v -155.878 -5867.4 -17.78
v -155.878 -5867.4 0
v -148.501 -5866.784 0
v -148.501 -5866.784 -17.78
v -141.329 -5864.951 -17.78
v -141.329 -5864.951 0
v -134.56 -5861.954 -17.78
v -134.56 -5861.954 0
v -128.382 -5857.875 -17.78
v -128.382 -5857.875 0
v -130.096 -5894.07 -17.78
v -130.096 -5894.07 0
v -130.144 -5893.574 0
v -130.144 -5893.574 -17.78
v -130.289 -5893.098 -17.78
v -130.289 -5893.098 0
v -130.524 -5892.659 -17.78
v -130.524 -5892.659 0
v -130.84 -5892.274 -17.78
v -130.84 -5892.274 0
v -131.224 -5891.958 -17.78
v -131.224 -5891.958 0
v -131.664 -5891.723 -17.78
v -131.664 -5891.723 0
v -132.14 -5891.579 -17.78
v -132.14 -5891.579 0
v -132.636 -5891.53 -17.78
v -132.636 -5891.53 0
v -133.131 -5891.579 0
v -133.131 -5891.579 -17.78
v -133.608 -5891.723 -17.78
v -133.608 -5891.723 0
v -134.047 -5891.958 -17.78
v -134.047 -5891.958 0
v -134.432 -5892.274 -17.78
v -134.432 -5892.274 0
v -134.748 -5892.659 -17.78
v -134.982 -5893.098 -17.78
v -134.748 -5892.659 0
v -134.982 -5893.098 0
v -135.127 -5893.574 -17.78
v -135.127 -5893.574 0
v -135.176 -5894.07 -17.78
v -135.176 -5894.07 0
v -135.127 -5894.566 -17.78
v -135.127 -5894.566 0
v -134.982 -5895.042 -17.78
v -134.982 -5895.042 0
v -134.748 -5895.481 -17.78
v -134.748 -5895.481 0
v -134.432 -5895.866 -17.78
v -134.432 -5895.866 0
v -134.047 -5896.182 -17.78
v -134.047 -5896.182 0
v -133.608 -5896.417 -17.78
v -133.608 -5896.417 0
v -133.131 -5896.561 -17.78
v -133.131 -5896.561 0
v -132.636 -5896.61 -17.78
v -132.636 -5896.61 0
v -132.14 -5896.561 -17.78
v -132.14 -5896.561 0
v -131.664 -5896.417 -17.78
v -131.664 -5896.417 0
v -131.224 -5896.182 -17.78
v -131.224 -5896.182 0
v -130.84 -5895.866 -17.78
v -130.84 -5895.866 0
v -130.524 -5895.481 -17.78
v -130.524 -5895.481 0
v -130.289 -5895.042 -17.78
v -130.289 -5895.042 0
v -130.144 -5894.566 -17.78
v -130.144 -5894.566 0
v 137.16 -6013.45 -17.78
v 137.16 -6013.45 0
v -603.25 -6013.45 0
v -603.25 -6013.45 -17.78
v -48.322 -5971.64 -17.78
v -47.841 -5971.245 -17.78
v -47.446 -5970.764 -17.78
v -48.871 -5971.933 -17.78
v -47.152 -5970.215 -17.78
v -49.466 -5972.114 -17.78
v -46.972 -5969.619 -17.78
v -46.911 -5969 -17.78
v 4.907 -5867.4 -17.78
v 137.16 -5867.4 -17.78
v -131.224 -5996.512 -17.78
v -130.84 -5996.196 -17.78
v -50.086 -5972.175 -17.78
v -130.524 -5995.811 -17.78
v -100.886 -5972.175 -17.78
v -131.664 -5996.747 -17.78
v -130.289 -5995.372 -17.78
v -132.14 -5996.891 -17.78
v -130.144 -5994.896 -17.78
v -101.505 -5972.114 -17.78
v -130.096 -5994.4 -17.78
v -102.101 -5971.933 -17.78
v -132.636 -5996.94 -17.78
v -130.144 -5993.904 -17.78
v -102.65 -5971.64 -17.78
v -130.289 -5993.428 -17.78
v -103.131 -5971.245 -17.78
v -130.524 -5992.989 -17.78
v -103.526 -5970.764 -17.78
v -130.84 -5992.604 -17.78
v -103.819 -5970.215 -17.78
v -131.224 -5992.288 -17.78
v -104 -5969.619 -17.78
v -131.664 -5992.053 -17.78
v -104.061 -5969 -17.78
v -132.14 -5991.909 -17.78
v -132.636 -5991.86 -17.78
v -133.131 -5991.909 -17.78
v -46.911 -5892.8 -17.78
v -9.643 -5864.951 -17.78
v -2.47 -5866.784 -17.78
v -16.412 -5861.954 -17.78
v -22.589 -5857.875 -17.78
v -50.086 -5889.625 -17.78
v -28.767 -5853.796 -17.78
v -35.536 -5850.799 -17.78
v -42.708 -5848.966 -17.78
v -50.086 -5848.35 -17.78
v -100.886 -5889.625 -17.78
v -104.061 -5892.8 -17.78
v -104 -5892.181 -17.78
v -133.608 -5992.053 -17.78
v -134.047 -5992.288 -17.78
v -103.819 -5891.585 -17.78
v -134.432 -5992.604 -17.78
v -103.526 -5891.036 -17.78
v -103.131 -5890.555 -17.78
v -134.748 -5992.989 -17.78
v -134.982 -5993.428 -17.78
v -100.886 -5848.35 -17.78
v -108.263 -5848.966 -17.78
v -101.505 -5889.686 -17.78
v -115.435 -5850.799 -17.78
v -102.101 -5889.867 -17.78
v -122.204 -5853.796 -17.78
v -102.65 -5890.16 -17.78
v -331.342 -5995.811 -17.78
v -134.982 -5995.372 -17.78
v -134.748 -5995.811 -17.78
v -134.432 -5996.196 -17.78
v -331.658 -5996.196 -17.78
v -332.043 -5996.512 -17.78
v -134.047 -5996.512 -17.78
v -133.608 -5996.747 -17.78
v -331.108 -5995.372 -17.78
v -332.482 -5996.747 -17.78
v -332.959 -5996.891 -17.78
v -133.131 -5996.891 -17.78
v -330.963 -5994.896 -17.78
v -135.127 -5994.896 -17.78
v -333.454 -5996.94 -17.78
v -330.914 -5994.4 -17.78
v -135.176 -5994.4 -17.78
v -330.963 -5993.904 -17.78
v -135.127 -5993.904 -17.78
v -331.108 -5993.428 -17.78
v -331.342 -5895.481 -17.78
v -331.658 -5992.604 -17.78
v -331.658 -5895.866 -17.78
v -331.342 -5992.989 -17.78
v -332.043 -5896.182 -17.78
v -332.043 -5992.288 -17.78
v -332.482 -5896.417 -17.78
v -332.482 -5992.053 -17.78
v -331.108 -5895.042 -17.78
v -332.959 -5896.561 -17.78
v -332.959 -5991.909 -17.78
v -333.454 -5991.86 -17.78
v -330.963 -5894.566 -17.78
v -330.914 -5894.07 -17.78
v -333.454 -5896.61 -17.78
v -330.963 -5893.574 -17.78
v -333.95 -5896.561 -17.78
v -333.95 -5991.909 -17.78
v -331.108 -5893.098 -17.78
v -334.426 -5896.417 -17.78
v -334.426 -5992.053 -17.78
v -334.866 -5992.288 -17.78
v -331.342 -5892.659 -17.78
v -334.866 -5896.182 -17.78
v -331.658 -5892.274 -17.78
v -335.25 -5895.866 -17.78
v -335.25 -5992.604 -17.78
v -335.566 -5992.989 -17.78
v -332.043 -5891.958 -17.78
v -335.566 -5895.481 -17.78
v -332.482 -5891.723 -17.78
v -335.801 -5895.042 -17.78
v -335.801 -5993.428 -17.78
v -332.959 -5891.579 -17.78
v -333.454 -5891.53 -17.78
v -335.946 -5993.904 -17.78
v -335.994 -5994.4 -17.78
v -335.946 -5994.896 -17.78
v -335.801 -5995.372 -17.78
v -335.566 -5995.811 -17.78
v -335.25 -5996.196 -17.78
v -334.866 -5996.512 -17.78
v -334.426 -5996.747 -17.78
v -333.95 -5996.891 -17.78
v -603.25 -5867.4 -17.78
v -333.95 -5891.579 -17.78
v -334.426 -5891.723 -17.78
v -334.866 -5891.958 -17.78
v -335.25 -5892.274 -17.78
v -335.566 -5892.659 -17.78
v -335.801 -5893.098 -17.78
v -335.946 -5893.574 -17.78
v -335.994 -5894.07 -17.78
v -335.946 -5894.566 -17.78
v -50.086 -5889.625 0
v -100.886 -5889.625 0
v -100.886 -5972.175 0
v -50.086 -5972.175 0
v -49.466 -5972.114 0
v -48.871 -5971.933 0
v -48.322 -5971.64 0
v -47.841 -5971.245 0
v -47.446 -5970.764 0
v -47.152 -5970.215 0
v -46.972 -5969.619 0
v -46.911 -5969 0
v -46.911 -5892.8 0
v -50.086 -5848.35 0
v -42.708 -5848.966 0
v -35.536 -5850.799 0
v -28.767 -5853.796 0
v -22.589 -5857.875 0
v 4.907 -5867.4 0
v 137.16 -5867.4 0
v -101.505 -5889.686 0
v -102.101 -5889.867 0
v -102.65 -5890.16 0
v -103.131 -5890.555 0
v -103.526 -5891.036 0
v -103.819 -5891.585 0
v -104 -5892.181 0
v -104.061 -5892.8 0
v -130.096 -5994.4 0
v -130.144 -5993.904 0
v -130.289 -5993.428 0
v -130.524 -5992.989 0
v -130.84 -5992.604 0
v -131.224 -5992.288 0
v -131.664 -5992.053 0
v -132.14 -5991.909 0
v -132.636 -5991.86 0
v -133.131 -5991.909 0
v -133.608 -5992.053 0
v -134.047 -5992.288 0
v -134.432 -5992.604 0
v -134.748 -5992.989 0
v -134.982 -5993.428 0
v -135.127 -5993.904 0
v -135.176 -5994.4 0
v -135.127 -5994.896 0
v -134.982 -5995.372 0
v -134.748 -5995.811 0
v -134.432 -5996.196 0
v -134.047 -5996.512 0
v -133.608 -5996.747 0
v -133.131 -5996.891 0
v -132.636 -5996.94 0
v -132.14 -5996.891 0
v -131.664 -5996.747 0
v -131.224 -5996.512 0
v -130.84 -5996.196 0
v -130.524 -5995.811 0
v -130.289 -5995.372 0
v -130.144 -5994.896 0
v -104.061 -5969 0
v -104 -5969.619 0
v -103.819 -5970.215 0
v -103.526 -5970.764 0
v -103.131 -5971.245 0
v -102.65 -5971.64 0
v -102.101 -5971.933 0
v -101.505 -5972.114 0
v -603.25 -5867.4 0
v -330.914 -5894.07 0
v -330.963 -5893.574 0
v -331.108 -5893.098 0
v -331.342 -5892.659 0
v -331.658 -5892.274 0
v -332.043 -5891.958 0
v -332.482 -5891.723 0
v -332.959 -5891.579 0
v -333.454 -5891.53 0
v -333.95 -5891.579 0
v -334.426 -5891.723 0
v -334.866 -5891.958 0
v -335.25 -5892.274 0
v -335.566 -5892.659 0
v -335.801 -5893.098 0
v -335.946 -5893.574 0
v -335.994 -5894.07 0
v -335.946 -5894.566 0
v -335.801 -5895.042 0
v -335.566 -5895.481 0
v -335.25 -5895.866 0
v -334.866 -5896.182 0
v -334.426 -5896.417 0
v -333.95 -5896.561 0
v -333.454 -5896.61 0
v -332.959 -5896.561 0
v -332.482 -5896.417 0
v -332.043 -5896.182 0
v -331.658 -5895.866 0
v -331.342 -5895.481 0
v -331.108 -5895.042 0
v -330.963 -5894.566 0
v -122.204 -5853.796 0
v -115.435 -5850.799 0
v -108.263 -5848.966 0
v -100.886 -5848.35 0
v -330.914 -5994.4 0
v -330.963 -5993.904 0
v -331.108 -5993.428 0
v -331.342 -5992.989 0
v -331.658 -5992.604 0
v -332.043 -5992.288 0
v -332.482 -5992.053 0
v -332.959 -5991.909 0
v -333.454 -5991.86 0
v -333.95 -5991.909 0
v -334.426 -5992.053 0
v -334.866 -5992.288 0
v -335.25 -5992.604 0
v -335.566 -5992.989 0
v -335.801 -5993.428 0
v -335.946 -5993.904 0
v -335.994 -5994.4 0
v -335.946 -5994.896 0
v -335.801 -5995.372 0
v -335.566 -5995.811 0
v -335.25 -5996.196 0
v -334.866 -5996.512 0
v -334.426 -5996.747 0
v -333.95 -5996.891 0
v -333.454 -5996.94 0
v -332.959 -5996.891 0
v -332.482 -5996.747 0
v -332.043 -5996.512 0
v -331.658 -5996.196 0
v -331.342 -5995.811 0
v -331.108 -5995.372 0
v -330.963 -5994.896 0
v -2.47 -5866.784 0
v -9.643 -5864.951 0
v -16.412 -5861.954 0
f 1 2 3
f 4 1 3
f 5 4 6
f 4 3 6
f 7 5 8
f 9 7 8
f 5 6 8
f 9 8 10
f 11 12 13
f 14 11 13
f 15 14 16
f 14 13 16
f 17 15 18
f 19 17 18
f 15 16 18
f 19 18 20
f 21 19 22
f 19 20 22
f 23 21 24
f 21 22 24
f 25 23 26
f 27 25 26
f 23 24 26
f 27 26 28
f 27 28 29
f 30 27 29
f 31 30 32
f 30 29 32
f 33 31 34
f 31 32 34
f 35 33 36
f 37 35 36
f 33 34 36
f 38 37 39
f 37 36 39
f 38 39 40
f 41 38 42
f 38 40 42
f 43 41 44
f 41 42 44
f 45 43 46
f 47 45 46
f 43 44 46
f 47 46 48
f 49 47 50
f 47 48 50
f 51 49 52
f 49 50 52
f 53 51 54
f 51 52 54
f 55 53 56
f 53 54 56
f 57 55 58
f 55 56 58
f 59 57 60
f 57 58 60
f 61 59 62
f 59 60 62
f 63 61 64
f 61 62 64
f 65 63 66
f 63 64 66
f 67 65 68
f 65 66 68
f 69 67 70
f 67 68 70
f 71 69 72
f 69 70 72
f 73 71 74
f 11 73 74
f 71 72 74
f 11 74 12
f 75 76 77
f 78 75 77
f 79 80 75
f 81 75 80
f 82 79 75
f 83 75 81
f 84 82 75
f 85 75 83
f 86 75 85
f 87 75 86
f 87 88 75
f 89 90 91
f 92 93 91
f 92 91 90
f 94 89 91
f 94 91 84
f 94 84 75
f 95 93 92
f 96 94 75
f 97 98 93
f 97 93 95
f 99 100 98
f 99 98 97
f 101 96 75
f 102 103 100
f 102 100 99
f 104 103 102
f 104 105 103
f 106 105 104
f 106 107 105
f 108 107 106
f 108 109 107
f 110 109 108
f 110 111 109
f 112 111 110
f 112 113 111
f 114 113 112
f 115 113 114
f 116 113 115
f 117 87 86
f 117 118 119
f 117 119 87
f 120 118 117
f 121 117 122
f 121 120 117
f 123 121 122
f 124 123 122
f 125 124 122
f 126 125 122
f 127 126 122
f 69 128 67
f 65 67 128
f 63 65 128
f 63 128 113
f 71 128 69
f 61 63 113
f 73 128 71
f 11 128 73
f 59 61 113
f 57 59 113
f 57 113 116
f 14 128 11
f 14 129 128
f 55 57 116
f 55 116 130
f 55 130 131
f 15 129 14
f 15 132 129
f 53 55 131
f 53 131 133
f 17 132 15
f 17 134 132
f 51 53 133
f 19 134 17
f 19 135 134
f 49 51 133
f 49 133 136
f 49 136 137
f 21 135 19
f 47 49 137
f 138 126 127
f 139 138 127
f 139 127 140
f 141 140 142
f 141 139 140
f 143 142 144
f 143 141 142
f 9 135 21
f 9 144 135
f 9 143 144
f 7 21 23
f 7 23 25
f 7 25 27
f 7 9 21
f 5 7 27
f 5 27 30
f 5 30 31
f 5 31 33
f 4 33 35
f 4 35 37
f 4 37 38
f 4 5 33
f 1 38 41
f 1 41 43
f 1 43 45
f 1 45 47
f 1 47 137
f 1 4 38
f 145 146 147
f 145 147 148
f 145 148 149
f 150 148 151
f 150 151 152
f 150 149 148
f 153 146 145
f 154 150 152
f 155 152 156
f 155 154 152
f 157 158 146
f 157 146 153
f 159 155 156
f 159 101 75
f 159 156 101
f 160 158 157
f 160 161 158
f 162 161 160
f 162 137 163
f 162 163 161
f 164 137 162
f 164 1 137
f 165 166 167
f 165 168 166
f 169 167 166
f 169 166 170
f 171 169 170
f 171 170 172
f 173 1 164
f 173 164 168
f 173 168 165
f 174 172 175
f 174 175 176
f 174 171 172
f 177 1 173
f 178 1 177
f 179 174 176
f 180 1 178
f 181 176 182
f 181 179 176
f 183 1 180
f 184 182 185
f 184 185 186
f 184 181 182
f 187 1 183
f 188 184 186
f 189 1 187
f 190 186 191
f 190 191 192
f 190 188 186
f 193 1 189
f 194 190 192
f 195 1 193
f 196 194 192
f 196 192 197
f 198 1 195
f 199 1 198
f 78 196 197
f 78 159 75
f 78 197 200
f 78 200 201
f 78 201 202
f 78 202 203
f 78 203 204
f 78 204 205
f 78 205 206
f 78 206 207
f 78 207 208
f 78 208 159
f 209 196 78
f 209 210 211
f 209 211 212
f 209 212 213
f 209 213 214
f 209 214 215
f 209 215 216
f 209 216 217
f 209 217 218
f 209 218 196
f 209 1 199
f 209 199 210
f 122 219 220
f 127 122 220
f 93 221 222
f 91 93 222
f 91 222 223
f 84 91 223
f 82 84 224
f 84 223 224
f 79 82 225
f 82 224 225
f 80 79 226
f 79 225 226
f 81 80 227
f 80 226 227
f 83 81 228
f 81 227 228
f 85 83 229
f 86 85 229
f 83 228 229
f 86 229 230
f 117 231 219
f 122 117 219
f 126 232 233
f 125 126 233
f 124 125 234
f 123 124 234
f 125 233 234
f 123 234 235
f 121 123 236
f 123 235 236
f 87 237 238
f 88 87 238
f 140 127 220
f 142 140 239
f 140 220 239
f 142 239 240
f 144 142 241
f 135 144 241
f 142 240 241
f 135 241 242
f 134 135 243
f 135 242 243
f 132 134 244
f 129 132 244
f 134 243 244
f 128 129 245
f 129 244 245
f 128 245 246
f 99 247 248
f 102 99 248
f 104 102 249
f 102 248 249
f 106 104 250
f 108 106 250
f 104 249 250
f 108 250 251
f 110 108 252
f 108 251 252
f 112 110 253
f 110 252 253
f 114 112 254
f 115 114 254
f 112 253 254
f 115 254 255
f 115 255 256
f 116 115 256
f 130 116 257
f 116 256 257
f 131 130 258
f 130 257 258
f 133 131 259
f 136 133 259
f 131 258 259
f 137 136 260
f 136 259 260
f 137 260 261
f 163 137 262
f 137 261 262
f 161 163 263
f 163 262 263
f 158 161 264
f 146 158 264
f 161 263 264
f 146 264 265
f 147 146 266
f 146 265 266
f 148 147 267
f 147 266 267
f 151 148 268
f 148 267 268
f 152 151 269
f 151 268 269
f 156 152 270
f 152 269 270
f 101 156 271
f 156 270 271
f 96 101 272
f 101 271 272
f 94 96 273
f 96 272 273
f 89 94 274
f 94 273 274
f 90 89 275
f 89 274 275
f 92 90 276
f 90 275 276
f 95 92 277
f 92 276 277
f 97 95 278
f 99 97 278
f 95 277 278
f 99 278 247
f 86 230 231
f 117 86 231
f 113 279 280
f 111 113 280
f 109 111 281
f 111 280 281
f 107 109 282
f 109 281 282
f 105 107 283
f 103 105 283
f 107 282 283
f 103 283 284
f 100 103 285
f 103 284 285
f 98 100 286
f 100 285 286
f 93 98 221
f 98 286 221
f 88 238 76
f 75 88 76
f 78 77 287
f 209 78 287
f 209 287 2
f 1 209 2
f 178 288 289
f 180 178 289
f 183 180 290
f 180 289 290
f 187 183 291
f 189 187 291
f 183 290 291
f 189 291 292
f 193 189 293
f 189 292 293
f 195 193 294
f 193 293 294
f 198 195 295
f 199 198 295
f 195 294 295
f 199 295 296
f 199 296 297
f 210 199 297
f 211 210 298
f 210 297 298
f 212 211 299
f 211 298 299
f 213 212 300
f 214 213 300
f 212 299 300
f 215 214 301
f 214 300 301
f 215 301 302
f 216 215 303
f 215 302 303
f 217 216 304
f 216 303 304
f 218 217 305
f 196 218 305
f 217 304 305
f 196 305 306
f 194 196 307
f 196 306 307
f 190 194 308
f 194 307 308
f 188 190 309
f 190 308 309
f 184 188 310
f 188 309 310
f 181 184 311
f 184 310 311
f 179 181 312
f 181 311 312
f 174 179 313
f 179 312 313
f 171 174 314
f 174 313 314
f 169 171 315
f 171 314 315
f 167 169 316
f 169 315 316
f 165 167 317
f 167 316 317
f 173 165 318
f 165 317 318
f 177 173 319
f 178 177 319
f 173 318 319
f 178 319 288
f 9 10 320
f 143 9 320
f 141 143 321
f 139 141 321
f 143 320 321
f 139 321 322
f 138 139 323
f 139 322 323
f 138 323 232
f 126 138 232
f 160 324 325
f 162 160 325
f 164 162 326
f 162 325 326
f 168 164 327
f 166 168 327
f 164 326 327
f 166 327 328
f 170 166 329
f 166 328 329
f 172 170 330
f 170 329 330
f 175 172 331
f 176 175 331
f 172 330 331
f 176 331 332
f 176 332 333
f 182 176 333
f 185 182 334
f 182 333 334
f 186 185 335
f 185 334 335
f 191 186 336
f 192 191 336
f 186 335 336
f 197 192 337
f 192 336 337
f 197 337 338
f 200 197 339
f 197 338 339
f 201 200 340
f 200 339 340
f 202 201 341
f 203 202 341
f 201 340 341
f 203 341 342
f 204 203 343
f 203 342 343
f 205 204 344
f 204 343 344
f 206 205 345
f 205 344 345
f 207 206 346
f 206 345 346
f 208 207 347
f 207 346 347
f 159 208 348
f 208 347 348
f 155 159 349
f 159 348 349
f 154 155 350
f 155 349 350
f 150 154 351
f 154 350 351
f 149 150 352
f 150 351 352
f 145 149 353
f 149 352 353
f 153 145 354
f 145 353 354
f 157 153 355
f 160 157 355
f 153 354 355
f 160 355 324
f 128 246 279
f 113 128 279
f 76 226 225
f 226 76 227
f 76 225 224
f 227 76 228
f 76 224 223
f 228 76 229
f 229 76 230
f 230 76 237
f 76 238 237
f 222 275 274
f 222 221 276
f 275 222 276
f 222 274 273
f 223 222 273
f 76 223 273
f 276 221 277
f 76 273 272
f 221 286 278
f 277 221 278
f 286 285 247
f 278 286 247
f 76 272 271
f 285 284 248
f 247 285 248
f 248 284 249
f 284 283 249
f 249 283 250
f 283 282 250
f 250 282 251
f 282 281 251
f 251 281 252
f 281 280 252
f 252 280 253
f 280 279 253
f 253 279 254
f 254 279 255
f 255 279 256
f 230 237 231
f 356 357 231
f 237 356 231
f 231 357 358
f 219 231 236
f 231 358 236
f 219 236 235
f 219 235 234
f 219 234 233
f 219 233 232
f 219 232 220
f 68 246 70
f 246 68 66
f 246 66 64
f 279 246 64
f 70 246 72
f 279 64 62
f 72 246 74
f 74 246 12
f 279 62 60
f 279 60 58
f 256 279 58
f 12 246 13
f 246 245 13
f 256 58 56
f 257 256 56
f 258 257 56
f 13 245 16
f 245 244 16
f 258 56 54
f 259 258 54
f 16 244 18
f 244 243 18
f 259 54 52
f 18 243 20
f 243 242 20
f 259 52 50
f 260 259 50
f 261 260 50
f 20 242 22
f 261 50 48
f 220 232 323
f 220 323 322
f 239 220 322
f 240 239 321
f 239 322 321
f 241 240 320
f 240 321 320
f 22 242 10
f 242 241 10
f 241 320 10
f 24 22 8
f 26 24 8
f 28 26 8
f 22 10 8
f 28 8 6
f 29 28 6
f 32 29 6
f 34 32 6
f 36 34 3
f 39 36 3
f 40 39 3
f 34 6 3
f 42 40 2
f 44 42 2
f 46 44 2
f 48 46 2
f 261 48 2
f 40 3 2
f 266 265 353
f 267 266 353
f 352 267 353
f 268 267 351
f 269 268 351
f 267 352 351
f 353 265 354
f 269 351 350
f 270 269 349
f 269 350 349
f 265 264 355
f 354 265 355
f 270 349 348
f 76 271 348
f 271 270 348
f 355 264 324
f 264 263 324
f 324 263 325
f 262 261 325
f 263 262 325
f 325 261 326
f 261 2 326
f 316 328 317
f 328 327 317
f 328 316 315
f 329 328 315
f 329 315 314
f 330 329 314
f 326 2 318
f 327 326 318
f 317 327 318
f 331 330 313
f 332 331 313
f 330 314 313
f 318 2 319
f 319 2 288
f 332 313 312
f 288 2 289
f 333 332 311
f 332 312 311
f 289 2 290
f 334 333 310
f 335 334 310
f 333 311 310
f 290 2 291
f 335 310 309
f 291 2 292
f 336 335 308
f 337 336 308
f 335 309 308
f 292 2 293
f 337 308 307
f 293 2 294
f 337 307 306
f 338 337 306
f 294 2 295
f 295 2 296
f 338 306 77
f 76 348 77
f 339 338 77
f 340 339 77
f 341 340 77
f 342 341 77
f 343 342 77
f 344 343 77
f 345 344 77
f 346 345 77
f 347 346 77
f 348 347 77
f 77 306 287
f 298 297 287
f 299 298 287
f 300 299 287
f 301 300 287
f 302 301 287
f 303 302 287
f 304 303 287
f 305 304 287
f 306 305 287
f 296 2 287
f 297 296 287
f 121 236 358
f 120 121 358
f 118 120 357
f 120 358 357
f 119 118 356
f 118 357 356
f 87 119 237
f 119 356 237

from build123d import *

# Parameters (mm, degrees)
HEADDISPLAYBRACKET_THICKNESS_DEPTH = 17.78
SKETCH3_R                          = 2.54
CUT_EXTRUDE1_DEPTH                 = 17.78


with BuildPart() as part:
    # HeadDisplayBraceOutline → HeadDisplayBracket_Thickness (new body)
    with BuildSketch(Plane.XY):
        with BuildLine():
            Line((137.16, -6013.450000001), (-603.25, -6013.450000001))
            Line((-603.25, -6013.450000001), (-603.25, -5867.400000001))
            Line((-603.25, -5867.400000001), (-155.878238141, -5867.400000001))
            ThreePointArc((-155.878238141, -5867.400000001), (-141.328560309, -5864.951302064), (-128.38193157, -5857.875))
            ThreePointArc((-128.38193157, -5857.875), (-115.435302831, -5850.798697937), (-100.885625, -5848.35))
            Line((-100.885625, -5848.35), (-50.085625, -5848.35))
            ThreePointArc((-50.085625, -5848.35), (-35.535947169, -5850.798697937), (-22.58931843, -5857.875))
            ThreePointArc((-22.58931843, -5857.875), (-9.642689691, -5864.951302063), (4.906988141, -5867.400000001))
            Line((4.906988141, -5867.400000001), (137.16, -5867.400000001))
            Line((137.16, -5867.400000001), (137.16, -6013.450000001))
        make_face()
    extrude(amount=-HEADDISPLAYBRACKET_THICKNESS_DEPTH)

    # Sketch3 → Cut-Extrude1 (cut)
    with BuildSketch(Plane.XY):
        with Locations((-333.454375, -5994.4)):
            Circle(SKETCH3_R)
        with Locations((-132.635625, -5994.4)):
            Circle(SKETCH3_R)
        with Locations((-132.635625, -5894.07)):
            Circle(SKETCH3_R)
        with Locations((-333.454375, -5894.07)):
            Circle(SKETCH3_R)
        with BuildLine():
            Line((-104.060625, -5892.8), (-104.060625, -5969))
            ThreePointArc((-104.060625, -5969), (-103.13068903, -5971.24506403), (-100.885625, -5972.175))
            Line((-100.885625, -5972.175), (-50.085625, -5972.175))
            ThreePointArc((-50.085625, -5972.175), (-47.84056097, -5971.24506403), (-46.910625, -5969))
            Line((-46.910625, -5969), (-46.910625, -5892.8))
            Line((-46.910625, -5892.8), (-50.085625, -5889.625))
            Line((-50.085625, -5889.625), (-100.885625, -5889.625))
            ThreePointArc((-100.885625, -5889.625), (-103.13068903, -5890.55493597), (-104.060625, -5892.8))
        make_face()
    extrude(amount=-CUT_EXTRUDE1_DEPTH, mode=Mode.SUBTRACT)


solid = part.part
